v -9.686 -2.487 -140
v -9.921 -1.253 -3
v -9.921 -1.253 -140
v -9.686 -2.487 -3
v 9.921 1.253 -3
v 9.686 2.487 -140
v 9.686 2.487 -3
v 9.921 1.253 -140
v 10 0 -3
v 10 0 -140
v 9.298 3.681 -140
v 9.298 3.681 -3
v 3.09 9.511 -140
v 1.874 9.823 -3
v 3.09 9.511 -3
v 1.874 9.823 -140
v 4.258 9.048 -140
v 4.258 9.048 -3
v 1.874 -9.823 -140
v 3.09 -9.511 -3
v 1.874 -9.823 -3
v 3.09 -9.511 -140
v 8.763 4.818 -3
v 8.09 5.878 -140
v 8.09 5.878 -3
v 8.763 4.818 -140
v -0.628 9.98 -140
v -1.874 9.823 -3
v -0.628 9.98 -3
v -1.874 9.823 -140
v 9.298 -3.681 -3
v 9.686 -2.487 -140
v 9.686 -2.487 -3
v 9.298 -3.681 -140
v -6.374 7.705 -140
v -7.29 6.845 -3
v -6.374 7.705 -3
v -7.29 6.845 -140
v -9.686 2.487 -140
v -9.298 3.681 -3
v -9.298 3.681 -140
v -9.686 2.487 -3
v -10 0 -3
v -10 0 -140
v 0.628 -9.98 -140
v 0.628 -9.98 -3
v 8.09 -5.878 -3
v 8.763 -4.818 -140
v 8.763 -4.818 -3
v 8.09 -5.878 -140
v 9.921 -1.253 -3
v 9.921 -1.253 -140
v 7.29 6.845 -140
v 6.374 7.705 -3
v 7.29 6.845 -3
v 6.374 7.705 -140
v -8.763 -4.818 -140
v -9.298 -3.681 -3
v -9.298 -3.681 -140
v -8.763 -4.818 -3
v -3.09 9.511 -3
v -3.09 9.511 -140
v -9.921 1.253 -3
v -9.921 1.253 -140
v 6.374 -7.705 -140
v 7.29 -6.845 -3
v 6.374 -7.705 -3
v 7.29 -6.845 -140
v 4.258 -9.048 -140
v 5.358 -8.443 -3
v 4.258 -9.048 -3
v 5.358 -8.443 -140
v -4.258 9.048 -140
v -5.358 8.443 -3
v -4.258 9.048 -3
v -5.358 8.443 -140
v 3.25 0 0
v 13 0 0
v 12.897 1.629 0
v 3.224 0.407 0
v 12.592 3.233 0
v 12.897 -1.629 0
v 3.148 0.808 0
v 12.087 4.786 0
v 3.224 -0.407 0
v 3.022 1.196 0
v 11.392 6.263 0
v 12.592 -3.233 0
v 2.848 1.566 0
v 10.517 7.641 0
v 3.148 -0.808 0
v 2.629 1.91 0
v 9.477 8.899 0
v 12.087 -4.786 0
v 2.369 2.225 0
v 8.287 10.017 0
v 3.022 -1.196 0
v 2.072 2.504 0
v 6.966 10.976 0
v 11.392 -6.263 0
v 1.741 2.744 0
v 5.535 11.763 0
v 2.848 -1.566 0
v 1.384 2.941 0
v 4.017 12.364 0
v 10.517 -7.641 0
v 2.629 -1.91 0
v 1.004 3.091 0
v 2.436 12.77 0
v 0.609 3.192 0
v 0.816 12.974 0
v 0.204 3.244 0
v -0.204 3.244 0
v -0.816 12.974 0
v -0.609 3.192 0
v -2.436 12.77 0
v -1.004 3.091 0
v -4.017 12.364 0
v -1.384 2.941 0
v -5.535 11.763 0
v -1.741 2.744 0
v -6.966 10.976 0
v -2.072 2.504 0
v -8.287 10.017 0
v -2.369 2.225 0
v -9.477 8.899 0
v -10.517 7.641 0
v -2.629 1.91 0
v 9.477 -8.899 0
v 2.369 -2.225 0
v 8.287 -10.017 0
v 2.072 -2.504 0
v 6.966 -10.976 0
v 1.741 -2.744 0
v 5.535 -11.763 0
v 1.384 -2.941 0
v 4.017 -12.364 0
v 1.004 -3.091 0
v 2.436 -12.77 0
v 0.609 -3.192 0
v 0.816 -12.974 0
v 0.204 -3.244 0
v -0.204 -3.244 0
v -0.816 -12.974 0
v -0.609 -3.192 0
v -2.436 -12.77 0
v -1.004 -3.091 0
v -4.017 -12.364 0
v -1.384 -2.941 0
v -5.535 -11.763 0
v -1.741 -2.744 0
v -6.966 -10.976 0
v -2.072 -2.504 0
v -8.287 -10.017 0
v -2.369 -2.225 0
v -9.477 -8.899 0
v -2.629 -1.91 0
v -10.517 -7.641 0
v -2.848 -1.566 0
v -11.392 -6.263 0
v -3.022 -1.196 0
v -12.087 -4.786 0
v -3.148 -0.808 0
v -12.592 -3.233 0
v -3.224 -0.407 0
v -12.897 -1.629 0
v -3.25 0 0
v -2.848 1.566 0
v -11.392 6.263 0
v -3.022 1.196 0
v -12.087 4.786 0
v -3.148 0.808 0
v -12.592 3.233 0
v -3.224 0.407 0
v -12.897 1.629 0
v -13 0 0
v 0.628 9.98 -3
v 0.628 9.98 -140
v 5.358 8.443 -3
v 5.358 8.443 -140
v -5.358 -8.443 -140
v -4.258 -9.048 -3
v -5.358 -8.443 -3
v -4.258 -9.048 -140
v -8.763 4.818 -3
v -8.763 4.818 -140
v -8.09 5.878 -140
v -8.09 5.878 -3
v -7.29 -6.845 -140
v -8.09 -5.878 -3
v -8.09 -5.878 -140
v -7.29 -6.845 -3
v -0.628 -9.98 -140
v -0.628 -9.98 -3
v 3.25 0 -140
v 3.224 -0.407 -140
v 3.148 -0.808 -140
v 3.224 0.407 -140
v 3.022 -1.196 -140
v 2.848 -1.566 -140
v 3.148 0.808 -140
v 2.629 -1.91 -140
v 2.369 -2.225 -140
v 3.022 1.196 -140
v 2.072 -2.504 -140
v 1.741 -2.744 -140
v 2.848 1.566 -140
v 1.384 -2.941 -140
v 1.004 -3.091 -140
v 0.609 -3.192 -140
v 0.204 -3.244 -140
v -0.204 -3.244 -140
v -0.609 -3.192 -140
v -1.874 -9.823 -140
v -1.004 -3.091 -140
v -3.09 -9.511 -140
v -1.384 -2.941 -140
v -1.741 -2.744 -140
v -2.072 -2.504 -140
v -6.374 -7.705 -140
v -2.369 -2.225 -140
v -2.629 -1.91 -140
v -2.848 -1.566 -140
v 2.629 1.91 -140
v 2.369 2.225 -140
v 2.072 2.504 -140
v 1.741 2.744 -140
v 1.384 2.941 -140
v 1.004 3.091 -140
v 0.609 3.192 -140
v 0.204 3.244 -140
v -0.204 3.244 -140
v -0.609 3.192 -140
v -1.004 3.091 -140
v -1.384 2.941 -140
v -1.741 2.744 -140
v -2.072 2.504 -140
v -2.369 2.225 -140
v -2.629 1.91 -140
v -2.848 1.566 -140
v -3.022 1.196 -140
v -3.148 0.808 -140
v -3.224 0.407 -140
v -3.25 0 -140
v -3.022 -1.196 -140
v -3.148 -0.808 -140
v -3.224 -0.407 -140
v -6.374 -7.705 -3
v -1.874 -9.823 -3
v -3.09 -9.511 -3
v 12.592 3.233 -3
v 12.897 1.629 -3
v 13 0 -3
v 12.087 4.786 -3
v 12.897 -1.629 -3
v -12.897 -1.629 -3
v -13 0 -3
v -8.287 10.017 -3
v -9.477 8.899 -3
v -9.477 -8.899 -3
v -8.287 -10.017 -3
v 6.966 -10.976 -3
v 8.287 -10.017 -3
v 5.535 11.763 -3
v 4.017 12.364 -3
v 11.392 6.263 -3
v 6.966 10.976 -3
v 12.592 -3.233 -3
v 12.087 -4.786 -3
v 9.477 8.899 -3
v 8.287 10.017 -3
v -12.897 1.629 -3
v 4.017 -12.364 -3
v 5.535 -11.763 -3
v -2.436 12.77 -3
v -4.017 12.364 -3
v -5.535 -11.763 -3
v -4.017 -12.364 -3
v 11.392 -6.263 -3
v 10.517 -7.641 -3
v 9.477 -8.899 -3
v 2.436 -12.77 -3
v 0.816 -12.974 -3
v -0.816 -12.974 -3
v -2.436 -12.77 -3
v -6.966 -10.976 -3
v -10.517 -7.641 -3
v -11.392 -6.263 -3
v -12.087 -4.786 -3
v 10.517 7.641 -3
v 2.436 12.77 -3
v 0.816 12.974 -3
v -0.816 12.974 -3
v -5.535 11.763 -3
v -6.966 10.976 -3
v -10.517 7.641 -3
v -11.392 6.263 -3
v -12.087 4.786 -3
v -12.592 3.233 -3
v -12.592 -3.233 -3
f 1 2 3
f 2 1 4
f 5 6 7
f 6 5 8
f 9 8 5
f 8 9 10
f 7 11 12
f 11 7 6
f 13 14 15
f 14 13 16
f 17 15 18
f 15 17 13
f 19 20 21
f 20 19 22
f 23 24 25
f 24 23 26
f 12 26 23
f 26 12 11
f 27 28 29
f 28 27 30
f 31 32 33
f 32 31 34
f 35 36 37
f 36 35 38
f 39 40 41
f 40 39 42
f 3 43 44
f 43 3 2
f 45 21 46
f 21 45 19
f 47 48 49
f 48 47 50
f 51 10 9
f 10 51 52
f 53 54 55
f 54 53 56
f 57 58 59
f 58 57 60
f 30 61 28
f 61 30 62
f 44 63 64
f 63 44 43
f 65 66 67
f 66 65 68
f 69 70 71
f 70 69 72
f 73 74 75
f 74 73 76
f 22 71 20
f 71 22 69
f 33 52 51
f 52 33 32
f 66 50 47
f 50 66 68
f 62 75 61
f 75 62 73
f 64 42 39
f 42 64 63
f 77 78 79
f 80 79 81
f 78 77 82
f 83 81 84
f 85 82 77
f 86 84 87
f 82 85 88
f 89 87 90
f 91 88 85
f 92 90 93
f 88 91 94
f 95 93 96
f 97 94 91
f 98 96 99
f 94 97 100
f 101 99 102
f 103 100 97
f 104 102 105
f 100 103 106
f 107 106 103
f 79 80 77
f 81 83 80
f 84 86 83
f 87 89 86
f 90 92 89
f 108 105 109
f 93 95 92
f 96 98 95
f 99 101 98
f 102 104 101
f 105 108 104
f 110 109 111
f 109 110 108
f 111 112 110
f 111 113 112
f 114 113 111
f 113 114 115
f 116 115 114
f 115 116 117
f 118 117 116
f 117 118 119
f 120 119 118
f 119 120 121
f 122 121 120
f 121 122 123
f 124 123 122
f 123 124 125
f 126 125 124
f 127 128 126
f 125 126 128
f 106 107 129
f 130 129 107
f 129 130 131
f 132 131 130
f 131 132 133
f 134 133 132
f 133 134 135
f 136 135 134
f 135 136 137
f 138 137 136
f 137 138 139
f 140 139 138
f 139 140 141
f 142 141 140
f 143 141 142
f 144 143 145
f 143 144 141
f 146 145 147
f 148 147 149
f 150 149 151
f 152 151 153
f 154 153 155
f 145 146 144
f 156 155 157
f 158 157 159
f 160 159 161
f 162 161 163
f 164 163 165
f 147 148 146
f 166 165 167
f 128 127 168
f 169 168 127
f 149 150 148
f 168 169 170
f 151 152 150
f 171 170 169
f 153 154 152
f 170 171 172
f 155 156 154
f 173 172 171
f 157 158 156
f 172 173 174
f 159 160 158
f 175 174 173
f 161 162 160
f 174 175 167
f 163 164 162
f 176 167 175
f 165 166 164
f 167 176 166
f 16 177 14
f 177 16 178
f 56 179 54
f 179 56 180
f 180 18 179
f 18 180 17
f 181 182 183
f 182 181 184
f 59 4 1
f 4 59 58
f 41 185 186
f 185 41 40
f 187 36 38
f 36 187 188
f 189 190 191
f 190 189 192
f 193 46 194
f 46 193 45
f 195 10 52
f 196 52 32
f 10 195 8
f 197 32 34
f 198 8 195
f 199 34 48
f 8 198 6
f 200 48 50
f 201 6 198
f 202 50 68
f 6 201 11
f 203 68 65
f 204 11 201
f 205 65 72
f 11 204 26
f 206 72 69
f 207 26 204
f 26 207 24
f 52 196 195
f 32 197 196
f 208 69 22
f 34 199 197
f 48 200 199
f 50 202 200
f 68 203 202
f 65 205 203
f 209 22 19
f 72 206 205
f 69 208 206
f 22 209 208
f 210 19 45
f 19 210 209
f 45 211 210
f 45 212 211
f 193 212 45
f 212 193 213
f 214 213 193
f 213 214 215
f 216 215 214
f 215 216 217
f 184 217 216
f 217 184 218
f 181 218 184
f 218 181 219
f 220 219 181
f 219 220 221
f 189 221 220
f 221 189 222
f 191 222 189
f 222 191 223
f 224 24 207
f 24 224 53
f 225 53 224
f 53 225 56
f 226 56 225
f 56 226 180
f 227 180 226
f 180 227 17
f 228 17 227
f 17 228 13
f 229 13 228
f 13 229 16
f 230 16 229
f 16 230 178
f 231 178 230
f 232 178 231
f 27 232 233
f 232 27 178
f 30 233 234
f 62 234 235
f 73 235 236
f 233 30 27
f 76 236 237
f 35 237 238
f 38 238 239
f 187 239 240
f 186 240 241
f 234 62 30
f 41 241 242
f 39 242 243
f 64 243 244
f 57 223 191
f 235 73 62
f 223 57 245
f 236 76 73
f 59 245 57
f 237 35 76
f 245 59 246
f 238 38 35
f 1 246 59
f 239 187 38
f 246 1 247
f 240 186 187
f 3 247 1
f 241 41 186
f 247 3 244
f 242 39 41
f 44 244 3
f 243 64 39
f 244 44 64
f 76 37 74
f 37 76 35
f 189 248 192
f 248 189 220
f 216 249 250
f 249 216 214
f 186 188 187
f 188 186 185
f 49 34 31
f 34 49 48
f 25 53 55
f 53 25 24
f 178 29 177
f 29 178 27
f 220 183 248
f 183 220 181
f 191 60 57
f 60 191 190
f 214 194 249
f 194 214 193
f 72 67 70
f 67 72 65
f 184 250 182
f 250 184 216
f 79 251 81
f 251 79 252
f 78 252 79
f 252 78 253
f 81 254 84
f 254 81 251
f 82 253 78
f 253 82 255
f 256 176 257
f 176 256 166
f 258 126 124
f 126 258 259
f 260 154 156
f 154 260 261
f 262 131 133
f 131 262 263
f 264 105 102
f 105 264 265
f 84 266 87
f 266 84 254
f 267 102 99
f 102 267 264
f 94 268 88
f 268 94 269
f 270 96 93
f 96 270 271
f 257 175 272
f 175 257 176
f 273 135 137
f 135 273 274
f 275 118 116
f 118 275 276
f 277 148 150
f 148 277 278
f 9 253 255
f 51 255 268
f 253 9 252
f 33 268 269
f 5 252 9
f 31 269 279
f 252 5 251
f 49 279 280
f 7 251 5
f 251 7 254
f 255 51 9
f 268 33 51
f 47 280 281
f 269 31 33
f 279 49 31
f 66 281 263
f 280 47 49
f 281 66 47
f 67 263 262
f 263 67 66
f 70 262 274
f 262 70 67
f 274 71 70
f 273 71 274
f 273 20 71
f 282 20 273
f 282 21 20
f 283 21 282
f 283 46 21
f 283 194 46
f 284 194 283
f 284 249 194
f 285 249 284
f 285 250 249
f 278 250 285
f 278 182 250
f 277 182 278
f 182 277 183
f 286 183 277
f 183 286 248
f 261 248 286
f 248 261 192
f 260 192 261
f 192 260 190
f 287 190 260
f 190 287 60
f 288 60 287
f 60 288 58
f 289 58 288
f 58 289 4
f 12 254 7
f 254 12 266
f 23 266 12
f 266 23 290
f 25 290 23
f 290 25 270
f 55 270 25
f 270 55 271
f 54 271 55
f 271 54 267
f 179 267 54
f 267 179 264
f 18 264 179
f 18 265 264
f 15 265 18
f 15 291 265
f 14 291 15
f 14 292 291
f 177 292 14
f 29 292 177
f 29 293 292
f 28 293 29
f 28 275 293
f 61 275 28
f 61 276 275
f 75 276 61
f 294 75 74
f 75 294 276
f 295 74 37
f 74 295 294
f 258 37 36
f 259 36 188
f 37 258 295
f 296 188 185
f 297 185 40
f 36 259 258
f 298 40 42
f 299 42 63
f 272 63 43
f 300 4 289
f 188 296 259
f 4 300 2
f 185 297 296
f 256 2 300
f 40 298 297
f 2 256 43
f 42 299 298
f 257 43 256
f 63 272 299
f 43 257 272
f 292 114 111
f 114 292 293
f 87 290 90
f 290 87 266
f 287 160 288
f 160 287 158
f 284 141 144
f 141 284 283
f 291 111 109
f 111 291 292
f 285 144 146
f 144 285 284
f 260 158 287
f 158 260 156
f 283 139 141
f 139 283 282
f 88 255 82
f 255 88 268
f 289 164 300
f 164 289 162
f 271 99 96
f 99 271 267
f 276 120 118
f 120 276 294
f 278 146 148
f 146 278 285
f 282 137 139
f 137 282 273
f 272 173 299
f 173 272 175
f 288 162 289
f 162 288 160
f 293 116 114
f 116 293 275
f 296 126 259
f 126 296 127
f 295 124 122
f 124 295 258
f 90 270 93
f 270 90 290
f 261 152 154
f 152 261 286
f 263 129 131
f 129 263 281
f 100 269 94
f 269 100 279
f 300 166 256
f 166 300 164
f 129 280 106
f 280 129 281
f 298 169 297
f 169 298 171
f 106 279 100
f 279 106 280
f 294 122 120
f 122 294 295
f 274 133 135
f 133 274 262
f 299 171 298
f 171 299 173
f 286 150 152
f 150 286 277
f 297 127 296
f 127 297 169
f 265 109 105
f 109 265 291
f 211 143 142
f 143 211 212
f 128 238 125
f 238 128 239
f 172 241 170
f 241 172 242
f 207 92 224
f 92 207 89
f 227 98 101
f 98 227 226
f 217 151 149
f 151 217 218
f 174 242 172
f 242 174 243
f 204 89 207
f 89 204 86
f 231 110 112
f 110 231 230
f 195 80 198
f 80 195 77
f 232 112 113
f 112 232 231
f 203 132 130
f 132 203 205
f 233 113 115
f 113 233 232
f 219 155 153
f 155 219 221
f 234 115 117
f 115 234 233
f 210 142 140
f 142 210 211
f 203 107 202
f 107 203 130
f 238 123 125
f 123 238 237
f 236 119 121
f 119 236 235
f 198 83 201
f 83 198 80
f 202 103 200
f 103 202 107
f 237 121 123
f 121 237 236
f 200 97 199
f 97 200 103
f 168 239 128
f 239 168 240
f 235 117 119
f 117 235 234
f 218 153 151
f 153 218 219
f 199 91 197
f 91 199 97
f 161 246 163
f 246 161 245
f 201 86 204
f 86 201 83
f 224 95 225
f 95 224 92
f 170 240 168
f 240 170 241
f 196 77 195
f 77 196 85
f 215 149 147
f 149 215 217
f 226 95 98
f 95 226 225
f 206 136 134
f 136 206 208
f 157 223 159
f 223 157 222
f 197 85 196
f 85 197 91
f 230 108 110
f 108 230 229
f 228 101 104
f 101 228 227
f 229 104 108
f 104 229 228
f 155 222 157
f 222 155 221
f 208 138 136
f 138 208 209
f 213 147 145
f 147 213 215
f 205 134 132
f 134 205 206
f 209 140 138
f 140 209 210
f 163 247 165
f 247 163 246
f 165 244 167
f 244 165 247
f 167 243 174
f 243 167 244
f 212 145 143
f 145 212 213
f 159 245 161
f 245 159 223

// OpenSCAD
$fn = 50;


difference() {
	union() {
		translate(v = [0, 0, -140.0000000000]) {
			cylinder(h = 140, r = 10.0000000000);
		}
		translate(v = [0, 0, -3.0000000000]) {
			cylinder(h = 3, r = 13.0000000000);
		}
	}
	union() {
		#translate(v = [0, 0, -140]) {
			cylinder(h = 140, r = 3.2500000000);
		}
	}
}
